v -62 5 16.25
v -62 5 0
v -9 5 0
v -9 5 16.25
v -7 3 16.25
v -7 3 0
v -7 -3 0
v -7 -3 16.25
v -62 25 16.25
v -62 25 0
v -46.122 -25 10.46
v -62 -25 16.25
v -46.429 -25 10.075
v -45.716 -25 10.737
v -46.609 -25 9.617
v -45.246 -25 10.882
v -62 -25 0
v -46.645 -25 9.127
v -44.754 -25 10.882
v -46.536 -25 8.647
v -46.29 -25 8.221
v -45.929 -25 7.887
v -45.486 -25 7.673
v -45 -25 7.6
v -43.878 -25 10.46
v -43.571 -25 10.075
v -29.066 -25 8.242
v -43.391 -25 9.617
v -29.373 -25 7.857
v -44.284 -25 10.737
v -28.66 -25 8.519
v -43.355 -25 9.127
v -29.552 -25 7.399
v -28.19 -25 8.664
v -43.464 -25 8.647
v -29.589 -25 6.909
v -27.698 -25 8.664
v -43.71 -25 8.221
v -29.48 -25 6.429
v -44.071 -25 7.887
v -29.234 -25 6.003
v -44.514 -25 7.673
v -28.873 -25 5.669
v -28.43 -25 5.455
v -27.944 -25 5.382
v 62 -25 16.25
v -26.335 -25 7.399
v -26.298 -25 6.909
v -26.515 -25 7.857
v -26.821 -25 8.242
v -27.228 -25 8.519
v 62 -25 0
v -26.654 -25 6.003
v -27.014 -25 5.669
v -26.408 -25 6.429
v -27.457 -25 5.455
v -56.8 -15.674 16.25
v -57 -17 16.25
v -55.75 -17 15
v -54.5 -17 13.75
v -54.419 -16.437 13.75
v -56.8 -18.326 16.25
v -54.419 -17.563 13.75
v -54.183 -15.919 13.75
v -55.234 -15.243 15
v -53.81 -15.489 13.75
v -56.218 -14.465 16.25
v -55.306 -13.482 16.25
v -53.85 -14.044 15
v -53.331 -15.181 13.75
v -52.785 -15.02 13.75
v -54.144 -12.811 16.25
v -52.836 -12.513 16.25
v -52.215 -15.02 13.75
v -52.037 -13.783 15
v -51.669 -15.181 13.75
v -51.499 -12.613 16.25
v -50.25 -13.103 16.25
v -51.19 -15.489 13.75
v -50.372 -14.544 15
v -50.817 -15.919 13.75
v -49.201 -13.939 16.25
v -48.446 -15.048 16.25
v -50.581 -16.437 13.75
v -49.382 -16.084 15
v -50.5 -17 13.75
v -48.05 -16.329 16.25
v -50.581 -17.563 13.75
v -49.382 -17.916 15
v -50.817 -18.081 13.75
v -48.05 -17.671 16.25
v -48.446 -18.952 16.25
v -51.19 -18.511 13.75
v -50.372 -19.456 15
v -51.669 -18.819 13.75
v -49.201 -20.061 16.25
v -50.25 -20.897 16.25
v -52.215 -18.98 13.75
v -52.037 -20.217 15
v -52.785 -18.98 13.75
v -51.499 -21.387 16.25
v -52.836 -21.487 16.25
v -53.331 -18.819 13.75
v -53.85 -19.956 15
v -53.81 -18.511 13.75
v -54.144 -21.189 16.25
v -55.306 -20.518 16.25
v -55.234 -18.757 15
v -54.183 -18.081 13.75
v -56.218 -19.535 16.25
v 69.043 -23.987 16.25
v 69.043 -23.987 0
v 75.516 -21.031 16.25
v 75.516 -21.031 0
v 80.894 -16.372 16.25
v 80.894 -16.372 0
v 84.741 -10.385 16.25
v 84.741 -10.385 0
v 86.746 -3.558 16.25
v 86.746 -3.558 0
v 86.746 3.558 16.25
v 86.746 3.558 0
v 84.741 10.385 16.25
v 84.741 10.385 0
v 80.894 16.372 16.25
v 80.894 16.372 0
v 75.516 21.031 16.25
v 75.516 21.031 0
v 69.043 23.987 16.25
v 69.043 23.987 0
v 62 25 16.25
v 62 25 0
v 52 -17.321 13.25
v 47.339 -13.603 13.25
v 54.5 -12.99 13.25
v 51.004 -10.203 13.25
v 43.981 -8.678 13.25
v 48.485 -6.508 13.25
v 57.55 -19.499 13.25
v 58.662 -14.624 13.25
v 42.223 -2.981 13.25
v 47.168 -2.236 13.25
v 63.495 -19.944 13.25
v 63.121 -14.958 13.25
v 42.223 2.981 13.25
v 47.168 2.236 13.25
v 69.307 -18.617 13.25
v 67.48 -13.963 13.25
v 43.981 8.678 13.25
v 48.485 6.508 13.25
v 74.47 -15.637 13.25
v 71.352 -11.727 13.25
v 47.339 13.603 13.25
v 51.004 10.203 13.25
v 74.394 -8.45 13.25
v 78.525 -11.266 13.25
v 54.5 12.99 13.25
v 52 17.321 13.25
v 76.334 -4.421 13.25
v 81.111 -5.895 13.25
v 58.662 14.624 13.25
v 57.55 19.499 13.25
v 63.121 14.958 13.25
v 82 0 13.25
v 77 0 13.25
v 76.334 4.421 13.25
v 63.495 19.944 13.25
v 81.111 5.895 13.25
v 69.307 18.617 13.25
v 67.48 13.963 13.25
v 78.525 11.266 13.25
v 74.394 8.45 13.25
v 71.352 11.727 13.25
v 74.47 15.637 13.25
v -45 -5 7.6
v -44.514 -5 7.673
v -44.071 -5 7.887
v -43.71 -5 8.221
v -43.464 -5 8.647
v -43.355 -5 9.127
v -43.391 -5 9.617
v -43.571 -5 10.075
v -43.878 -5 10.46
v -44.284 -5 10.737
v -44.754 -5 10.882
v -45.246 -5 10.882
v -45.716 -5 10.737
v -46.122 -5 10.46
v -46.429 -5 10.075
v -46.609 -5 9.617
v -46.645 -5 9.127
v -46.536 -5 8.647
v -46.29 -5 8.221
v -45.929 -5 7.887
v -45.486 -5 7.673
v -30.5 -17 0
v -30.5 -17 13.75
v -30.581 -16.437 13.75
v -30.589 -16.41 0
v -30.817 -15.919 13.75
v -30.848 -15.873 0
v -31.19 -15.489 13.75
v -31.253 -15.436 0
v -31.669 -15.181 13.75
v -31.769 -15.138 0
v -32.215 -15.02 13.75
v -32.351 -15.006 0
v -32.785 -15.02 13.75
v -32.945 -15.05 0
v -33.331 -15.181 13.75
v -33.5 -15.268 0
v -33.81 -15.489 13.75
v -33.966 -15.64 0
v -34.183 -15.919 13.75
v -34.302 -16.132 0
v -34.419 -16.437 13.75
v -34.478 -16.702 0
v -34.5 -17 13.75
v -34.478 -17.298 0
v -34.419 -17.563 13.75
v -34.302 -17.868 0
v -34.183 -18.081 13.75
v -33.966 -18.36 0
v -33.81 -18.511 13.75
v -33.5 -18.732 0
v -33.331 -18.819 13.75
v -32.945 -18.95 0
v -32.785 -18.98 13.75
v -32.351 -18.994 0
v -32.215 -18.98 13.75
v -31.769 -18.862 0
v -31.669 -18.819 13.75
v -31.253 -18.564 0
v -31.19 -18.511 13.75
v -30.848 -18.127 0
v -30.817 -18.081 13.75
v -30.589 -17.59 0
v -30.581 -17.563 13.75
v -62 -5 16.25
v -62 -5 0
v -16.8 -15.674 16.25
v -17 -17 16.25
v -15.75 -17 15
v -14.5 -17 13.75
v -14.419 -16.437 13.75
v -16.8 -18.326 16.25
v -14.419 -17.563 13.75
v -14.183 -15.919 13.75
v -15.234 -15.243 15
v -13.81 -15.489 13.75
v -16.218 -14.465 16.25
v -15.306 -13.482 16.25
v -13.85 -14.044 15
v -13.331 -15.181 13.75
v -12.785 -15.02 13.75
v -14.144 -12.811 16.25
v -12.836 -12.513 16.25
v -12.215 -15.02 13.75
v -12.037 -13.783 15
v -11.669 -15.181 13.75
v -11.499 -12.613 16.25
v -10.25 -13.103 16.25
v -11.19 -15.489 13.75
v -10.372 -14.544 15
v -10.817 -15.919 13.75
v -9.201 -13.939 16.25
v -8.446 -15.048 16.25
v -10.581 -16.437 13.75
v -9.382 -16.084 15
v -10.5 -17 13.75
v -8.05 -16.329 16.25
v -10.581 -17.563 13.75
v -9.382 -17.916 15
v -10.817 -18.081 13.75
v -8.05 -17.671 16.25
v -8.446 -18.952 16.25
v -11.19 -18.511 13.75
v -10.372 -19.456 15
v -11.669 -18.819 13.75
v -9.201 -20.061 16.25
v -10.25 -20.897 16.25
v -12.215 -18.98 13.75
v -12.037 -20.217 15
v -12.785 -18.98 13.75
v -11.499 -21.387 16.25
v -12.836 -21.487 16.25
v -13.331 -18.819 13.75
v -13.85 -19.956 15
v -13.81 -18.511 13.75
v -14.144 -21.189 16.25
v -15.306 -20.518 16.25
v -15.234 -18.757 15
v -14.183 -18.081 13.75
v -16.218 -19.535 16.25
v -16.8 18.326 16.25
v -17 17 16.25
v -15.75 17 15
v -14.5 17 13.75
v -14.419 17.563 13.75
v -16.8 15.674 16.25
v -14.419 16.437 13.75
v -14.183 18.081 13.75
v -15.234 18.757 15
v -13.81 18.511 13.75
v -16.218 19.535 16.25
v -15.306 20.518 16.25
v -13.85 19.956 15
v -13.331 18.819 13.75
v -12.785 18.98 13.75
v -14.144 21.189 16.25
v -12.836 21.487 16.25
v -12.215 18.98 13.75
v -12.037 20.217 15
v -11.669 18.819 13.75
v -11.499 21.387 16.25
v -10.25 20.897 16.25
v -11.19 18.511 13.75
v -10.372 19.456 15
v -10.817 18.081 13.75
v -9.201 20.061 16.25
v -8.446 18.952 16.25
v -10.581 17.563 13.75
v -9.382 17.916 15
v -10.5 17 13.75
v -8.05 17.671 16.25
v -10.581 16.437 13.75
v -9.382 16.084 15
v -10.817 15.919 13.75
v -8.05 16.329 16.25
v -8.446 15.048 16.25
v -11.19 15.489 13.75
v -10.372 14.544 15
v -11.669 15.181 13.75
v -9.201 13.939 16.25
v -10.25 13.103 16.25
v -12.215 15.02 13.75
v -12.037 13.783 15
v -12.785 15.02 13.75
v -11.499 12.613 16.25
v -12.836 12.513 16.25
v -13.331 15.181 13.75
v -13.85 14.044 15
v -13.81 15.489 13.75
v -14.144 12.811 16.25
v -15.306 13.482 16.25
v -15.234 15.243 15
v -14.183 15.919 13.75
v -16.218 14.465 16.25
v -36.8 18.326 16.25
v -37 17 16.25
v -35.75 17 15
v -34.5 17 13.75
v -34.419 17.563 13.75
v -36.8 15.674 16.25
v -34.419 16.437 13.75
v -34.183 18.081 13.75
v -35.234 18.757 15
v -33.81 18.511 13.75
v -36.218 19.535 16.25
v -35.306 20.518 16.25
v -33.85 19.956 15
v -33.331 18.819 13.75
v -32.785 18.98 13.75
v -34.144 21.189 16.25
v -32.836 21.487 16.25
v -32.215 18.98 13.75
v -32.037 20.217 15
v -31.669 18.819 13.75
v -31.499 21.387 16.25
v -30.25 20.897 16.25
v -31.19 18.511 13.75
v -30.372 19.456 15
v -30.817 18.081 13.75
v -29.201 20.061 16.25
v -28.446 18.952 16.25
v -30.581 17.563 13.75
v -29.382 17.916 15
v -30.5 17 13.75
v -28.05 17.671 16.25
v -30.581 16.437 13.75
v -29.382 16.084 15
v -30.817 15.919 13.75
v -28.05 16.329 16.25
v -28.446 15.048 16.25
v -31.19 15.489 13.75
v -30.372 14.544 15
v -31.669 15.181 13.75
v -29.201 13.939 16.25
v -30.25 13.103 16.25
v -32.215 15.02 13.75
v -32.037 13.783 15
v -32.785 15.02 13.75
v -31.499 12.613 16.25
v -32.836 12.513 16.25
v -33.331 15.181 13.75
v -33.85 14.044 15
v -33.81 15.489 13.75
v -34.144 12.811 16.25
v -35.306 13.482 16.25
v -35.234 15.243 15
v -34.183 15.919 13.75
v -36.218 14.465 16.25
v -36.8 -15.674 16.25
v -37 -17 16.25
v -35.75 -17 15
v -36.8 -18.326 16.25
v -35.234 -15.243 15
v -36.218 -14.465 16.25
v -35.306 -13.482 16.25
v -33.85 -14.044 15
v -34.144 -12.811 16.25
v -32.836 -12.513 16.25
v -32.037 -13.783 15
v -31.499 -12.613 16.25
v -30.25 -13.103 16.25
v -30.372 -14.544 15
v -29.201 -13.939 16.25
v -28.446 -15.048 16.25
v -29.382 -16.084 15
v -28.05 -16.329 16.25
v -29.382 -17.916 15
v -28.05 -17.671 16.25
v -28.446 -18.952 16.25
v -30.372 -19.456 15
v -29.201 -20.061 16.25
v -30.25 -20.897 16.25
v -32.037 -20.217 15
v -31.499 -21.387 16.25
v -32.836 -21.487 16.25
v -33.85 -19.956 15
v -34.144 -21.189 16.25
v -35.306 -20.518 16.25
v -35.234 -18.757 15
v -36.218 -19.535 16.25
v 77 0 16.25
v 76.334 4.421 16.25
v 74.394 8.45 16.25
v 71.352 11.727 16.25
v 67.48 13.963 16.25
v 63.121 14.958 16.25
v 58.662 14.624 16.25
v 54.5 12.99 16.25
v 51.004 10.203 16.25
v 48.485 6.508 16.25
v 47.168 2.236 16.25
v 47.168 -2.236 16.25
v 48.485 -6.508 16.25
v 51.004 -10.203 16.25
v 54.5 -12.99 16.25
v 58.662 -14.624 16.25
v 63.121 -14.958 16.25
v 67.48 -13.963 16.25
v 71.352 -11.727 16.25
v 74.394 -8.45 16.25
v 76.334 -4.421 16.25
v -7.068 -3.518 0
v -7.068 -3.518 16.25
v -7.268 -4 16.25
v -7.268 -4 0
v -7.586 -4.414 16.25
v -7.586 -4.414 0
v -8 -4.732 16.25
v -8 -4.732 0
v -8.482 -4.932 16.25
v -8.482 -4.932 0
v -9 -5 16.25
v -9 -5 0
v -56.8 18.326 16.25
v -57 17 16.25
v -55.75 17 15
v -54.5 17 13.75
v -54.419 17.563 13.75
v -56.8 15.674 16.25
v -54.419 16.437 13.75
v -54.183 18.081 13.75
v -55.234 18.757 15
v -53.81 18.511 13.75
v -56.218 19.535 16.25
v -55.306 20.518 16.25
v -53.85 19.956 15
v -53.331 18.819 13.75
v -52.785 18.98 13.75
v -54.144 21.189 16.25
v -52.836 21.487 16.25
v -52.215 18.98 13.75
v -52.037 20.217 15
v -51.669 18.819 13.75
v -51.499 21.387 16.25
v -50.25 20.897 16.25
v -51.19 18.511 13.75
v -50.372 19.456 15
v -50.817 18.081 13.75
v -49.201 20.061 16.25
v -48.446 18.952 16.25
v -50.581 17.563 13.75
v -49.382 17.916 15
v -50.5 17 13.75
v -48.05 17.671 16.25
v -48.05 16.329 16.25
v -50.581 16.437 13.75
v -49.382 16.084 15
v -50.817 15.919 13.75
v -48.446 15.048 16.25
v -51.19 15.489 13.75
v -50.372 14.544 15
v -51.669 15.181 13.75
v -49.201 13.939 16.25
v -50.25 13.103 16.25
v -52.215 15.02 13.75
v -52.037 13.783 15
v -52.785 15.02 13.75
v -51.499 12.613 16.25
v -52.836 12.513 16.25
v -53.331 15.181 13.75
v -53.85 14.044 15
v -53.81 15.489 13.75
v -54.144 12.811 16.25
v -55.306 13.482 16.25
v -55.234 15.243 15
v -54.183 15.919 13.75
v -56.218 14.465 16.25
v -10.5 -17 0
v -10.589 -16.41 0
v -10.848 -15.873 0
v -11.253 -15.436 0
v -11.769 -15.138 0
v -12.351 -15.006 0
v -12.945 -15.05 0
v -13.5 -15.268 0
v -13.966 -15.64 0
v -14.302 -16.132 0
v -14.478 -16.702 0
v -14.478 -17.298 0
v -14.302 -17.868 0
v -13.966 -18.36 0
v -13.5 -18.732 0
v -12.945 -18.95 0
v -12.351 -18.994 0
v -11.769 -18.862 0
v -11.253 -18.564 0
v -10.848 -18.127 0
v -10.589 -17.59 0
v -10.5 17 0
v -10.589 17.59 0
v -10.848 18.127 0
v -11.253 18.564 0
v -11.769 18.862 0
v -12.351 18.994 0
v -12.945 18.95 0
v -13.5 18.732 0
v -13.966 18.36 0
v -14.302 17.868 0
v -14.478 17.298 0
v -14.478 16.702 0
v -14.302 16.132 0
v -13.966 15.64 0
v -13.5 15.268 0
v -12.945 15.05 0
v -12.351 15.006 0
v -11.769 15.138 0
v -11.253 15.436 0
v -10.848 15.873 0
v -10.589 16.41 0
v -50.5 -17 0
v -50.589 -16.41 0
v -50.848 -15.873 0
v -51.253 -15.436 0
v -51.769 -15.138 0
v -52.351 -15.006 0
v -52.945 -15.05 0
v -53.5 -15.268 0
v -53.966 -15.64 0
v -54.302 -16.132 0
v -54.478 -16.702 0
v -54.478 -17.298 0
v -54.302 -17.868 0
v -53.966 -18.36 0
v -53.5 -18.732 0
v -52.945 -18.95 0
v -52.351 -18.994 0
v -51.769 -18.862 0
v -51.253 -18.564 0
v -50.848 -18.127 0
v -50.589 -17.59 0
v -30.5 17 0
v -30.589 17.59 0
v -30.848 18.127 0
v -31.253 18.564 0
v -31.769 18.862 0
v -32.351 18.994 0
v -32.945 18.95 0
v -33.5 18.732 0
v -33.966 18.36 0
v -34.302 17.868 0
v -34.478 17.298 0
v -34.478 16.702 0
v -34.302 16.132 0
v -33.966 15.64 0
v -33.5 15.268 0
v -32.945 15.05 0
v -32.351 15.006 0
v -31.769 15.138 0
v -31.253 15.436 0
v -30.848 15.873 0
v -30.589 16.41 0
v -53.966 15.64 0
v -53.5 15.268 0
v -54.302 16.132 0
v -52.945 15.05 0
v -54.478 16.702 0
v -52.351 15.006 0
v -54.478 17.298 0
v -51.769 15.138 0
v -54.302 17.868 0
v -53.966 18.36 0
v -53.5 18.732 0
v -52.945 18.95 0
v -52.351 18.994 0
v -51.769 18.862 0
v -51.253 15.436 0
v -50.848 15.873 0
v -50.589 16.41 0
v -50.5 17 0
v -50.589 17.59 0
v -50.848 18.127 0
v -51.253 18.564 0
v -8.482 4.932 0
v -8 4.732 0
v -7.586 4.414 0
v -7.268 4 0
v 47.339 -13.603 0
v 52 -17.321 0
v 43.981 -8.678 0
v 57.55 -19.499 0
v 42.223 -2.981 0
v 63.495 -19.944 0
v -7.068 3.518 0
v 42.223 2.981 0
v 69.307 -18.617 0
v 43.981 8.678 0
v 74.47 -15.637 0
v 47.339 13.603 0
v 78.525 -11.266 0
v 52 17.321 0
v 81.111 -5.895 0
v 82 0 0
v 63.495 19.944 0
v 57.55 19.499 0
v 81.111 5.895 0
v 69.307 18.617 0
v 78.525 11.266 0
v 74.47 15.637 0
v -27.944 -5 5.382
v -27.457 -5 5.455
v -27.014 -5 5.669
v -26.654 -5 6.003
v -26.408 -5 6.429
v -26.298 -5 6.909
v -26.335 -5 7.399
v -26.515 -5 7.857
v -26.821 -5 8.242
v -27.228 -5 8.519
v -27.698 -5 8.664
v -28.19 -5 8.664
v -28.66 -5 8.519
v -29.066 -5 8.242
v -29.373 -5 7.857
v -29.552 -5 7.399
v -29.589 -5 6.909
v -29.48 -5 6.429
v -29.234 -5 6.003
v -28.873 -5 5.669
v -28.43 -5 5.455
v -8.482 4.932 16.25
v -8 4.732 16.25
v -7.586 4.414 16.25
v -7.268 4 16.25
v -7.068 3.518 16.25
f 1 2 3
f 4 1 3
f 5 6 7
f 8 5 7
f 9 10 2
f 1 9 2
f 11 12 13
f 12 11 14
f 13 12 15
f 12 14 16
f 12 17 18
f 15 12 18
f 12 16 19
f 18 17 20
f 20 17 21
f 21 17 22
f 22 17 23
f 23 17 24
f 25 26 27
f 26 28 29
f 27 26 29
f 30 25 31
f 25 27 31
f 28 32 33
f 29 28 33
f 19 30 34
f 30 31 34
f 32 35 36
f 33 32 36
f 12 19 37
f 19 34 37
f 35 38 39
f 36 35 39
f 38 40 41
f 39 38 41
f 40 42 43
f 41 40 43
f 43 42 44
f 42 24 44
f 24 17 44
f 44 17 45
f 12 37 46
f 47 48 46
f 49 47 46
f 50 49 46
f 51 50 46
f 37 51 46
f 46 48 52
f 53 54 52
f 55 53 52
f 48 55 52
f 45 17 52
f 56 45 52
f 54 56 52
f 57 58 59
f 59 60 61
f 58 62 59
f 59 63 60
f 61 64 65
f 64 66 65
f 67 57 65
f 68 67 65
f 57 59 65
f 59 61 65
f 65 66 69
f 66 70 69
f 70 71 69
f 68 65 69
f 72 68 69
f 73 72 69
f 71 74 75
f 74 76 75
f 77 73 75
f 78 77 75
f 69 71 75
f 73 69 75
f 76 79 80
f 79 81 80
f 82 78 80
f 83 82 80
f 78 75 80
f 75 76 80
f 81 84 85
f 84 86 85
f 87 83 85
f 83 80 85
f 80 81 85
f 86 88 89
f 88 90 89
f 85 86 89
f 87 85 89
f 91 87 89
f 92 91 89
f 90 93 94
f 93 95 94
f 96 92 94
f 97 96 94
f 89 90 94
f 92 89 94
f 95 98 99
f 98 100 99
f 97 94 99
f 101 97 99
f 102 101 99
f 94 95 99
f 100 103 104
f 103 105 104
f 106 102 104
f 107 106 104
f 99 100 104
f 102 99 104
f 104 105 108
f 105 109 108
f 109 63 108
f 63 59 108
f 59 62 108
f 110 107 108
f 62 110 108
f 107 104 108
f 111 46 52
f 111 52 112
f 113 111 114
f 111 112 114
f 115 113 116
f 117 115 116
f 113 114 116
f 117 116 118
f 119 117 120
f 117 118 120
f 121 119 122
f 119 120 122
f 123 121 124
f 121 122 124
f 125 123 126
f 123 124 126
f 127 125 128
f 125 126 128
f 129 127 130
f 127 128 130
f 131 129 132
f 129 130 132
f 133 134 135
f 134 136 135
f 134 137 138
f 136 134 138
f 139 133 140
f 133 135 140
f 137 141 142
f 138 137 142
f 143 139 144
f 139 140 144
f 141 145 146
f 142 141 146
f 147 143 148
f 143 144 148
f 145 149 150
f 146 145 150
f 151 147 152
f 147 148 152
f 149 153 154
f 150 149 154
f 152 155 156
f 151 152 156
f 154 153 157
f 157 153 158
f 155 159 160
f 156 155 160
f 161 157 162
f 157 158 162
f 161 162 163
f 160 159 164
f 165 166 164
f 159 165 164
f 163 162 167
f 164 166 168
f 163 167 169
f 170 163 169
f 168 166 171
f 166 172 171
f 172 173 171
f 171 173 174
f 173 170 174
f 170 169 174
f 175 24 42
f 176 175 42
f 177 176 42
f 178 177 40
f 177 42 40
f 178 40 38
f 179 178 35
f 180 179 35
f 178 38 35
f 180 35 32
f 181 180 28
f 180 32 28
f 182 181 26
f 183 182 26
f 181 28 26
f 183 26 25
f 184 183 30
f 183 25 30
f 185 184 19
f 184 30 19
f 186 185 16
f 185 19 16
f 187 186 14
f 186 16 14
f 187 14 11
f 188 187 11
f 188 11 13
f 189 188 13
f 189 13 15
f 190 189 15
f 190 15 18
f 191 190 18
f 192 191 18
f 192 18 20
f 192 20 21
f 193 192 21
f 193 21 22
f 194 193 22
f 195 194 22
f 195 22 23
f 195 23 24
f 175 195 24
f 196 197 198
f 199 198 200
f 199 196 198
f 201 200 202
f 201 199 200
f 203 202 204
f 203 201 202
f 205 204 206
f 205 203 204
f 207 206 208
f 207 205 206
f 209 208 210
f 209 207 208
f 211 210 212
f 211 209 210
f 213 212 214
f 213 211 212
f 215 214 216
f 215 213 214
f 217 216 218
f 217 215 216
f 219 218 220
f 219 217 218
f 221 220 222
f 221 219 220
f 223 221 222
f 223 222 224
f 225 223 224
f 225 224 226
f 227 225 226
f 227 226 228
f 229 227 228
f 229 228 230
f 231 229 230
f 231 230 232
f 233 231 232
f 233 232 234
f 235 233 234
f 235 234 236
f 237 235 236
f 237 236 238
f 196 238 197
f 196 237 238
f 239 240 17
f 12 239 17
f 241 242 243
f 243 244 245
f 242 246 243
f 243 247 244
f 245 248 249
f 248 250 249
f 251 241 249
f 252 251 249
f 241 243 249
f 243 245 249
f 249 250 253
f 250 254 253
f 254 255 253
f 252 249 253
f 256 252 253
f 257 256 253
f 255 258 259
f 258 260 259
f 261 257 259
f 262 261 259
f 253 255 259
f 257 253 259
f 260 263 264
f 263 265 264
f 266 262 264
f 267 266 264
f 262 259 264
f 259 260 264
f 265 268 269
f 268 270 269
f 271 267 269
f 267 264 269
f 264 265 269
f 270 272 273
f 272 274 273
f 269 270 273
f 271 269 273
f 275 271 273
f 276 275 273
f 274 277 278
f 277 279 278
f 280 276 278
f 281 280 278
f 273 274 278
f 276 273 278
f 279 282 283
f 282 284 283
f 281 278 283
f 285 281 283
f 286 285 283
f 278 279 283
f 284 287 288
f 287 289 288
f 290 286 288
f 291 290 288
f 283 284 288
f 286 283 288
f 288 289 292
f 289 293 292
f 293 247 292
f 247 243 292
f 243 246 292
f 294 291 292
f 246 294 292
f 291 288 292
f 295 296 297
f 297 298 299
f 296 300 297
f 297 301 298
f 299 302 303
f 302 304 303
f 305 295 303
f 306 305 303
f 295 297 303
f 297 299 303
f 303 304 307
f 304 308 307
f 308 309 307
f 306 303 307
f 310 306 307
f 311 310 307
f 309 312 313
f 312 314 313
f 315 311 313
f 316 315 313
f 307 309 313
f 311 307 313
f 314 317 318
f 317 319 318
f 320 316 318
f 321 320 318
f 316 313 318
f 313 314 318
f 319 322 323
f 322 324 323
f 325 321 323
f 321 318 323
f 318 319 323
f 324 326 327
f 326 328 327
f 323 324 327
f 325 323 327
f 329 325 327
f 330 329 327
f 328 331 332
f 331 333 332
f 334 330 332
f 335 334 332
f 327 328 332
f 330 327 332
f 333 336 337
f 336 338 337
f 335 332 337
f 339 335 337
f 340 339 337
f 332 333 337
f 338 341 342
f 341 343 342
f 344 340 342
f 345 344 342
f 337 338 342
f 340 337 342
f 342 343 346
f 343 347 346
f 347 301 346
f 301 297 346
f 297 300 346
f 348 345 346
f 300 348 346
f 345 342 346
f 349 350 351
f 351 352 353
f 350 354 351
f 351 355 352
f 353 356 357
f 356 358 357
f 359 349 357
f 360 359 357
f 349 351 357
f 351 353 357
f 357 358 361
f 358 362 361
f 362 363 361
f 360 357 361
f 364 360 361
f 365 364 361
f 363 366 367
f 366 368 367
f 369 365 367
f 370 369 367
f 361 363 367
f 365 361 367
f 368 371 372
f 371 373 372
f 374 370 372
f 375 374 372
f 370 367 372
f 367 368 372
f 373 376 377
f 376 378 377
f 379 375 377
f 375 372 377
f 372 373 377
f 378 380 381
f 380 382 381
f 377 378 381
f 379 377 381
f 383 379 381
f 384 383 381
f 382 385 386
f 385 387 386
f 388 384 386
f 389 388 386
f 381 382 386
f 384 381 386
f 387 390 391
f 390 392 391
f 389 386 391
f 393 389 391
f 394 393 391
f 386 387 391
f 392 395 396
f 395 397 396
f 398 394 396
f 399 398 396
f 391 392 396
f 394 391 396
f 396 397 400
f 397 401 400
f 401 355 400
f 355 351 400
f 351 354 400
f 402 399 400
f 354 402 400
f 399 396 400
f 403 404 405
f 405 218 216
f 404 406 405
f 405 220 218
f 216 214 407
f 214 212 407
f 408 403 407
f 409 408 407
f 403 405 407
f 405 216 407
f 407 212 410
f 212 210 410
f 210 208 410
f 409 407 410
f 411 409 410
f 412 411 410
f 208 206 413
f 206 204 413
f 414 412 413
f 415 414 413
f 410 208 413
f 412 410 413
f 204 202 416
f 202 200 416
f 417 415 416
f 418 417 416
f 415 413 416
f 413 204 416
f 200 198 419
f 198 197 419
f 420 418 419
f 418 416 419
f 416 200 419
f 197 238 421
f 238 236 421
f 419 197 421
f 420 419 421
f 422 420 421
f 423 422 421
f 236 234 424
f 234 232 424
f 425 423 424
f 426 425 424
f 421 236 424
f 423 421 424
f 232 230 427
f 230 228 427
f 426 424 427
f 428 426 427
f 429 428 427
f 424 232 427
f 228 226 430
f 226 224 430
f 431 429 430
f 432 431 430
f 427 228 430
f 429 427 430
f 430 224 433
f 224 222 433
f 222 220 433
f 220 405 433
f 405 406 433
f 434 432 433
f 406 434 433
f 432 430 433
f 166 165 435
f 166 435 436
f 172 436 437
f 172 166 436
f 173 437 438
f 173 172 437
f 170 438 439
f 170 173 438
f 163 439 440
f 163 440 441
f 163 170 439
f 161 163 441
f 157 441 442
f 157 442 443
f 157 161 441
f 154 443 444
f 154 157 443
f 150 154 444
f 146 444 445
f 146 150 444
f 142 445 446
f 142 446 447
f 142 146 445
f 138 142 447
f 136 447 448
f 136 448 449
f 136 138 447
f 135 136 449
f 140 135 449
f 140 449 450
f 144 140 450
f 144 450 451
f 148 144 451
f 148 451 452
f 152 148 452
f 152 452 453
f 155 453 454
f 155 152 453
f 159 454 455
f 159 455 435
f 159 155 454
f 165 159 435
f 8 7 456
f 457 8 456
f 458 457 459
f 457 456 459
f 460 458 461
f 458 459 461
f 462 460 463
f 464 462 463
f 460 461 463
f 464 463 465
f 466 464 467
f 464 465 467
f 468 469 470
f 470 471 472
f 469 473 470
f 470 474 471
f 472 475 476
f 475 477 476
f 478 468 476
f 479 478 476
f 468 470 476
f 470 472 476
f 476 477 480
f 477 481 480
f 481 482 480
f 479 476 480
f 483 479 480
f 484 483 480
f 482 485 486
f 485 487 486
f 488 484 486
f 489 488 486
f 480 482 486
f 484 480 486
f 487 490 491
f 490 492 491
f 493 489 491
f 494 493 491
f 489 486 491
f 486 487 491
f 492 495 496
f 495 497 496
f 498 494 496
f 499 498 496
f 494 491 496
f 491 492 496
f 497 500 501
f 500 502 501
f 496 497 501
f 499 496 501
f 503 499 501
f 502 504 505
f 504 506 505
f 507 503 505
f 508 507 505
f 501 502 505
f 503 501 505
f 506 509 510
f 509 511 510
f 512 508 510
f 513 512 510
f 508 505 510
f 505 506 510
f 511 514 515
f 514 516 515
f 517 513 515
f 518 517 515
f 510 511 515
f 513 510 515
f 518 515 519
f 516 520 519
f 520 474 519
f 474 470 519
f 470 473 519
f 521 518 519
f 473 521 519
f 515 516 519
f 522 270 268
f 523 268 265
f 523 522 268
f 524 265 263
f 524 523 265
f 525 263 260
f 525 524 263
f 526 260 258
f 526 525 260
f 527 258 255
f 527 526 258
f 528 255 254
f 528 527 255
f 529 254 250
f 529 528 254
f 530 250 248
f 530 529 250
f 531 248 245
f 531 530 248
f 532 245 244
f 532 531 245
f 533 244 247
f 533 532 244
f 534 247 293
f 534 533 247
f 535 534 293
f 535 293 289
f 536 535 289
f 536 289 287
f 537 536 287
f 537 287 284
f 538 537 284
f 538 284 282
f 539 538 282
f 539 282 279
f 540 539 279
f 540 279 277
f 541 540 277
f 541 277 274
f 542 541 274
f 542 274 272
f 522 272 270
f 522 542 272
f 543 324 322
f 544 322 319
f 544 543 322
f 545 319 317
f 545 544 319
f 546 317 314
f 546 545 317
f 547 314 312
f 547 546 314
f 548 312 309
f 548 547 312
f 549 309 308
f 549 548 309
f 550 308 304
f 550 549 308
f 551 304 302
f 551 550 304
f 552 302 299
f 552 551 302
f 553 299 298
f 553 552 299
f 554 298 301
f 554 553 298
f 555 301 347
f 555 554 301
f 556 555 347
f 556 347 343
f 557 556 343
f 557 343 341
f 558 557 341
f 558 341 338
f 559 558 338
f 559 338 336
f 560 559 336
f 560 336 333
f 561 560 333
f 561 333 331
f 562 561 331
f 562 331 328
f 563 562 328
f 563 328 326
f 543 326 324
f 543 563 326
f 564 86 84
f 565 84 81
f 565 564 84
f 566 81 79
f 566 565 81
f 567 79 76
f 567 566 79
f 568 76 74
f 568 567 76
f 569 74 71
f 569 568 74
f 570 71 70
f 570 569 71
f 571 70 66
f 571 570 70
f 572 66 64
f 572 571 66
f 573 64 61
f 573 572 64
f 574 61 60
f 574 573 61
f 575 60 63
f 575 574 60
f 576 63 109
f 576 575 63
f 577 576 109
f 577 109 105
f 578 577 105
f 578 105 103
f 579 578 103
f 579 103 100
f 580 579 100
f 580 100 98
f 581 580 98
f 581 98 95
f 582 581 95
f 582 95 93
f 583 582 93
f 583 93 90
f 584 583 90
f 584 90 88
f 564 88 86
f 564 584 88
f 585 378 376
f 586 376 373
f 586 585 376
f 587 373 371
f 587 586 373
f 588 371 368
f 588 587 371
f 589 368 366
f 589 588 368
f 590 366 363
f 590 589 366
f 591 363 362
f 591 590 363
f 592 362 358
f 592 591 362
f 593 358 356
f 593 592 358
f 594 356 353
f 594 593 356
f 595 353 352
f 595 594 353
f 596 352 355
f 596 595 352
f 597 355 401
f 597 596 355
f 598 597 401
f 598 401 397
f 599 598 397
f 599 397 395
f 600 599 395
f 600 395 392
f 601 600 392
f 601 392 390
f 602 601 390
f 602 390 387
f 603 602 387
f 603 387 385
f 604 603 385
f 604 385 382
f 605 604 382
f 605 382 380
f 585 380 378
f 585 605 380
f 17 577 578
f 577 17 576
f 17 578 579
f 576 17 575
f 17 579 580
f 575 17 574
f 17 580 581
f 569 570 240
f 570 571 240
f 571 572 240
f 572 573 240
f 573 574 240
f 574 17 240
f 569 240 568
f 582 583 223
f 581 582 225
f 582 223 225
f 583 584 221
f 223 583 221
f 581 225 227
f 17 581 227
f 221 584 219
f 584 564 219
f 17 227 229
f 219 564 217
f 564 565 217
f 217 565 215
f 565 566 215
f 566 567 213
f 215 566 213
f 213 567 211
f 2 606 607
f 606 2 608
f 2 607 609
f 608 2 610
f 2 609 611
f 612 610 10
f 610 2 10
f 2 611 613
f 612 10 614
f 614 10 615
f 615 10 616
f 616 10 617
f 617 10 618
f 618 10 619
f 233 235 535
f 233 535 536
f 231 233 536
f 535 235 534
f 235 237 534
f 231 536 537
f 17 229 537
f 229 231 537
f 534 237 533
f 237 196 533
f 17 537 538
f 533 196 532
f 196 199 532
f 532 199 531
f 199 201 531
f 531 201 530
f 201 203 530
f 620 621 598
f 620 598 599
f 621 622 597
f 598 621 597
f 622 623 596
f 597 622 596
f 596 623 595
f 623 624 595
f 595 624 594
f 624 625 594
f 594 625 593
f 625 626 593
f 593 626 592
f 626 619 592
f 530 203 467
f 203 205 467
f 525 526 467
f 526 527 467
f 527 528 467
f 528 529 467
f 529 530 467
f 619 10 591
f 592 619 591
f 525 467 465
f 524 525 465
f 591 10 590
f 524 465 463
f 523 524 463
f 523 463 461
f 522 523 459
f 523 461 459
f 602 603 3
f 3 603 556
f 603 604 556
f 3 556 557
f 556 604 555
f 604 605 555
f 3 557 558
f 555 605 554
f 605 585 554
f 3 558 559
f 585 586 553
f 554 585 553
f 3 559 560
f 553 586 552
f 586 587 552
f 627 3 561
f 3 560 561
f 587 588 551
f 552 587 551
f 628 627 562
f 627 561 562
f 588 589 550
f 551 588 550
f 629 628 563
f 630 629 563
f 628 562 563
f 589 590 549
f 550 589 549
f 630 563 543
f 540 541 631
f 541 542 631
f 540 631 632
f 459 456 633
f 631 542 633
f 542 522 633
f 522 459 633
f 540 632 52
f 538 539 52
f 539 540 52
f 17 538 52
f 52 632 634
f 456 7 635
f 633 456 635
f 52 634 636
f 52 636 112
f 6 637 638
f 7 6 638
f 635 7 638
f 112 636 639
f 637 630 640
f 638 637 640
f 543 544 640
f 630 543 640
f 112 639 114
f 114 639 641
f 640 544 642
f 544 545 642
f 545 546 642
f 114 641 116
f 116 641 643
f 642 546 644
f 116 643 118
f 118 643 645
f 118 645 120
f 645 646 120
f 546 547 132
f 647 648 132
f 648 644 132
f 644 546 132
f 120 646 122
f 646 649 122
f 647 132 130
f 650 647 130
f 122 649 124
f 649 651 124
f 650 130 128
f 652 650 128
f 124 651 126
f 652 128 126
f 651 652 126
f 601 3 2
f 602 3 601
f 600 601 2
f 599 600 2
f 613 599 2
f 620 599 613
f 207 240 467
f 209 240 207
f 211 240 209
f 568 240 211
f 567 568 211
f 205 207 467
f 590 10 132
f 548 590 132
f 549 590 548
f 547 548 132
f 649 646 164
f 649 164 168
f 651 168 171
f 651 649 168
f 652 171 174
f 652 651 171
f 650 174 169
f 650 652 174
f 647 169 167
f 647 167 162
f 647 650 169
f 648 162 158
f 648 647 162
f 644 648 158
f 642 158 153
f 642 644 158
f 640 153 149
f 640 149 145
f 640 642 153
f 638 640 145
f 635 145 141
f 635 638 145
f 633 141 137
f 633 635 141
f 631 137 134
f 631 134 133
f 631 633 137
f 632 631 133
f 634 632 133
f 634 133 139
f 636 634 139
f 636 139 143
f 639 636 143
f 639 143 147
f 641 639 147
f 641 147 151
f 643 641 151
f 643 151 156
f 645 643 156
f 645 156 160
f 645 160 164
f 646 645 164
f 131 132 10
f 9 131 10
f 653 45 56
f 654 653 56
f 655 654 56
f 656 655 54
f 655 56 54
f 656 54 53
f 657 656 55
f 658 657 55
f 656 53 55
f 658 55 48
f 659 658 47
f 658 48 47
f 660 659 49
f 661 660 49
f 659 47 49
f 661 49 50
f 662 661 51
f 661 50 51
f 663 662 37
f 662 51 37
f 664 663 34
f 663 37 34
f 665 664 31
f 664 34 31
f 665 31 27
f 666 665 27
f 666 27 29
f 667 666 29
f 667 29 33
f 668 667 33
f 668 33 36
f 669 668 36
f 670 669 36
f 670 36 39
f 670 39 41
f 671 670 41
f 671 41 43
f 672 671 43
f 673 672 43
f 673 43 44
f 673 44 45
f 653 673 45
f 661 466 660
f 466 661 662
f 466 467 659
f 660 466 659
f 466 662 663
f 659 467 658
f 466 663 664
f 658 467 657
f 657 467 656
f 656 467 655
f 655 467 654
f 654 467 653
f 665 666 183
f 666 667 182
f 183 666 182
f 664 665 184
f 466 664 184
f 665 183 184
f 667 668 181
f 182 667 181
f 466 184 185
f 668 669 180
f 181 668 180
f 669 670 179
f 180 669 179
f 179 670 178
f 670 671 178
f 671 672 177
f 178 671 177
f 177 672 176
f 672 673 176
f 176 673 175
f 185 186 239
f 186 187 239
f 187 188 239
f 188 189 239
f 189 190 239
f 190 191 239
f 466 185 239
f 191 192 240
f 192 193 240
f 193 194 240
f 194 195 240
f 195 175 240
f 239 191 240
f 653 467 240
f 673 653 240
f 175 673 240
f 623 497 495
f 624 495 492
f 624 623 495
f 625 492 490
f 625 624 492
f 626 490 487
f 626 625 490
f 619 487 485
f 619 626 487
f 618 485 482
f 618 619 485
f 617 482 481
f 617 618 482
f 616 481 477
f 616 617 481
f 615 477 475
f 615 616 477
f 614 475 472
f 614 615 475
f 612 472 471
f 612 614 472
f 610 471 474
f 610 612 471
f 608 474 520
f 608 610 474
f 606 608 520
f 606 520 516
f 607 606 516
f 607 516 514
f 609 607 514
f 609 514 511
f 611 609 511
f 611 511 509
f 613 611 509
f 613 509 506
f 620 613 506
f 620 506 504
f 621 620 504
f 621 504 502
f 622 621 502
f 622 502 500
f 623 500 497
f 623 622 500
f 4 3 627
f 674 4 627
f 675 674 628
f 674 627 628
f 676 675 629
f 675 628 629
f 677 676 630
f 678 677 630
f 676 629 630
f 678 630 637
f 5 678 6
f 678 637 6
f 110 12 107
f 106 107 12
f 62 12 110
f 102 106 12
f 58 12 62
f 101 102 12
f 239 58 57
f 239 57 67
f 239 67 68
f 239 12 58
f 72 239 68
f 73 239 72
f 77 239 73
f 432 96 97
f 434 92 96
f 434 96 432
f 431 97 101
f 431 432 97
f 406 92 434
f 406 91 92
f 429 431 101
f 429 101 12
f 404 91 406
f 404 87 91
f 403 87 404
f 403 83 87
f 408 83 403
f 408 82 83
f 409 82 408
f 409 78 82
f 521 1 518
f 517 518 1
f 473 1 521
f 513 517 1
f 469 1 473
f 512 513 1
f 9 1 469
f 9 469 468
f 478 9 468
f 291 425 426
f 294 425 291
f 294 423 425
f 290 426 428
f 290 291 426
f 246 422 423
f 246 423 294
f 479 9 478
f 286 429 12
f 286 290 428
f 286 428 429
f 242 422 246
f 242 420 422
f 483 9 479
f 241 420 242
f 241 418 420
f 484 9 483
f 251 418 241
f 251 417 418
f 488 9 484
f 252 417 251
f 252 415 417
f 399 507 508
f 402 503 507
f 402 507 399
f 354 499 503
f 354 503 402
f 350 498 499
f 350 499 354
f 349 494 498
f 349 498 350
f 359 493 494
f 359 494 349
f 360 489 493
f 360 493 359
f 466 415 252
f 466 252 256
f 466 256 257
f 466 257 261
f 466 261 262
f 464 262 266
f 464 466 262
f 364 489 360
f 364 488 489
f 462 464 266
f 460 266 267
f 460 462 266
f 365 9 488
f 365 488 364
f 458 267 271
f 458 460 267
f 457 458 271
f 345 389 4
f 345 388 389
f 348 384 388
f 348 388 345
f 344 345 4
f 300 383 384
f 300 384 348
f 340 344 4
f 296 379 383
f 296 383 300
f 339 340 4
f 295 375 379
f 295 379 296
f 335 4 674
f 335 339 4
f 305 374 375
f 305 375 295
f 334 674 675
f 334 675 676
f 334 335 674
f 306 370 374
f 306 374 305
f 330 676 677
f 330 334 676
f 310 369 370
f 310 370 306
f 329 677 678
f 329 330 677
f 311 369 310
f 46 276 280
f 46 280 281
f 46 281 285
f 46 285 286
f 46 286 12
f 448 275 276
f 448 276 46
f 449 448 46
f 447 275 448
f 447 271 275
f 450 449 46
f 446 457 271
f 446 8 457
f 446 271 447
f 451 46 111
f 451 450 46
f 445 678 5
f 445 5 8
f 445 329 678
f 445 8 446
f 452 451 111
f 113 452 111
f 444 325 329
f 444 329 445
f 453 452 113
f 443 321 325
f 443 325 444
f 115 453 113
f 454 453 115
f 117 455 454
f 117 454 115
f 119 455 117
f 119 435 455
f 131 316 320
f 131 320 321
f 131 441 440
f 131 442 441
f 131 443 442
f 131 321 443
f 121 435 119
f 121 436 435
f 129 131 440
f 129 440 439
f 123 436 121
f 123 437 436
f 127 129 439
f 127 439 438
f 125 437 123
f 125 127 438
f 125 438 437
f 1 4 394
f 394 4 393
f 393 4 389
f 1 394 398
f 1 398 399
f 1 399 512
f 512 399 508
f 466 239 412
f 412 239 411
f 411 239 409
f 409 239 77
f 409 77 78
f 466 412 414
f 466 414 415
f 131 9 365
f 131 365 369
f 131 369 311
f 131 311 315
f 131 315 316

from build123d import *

# Parameters (mm, degrees)
SKETCH1_R                                       = 20
SKETCH1_R_2                                     = 2
BOSS_EXTRUDE1_DEPTH                             = 16.25
BOSS_EXTRUDE2_START                             = -3
SKETCH2_R                                       = 20
SKETCH2_R_2                                     = 15
BOSS_EXTRUDE2_DEPTH                             = 3
CSK_FOR_M5_FLAT_HEAD_MACHINE_SCREW1_D           = 4
CSK_FOR_M5_FLAT_HEAD_MACHINE_SCREW1_CSINK_D     = 9
CSK_FOR_M5_FLAT_HEAD_MACHINE_SCREW1_CSINK_ANGLE = 90
CUT_EXTRUDE1_REACH                              = 103.652
SKETCH7_R                                       = 1.65


with BuildPart() as part:
    # Sketch1 → Boss-Extrude1 (new body)
    with BuildSketch(Plane.XY):
        with BuildLine():
            Line((-62, 5), (-9, 5))
            ThreePointArc((-9, 5), (-7.585786438, 4.414213562), (-7, 3))
            Line((-7, 3), (-7, -3))
            ThreePointArc((-7, -3), (-7.585786438, -4.414213562), (-9, -5))
            Line((-9, -5), (-62, -5))
            Line((-62, -5), (-62, -25))
            Line((-62, -25), (62, -25))
            ThreePointArc((62, -25), (87, 0), (62, 25))
            Line((62, 25), (-62, 25))
            Line((-62, 25), (-62, 5))
        make_face()
        with Locations((62, 0)):
            Circle(SKETCH1_R, mode=Mode.SUBTRACT)
        with Locations((-52.5, 17)):
            Circle(SKETCH1_R_2, mode=Mode.SUBTRACT)
        with Locations((-32.5, 17)):
            Circle(SKETCH1_R_2, mode=Mode.SUBTRACT)
        with Locations((-12.5, 17)):
            Circle(SKETCH1_R_2, mode=Mode.SUBTRACT)
        with Locations((-32.5, -17)):
            Circle(SKETCH1_R_2, mode=Mode.SUBTRACT)
        with Locations((-12.5, -17)):
            Circle(SKETCH1_R_2, mode=Mode.SUBTRACT)
        with Locations((-52.5, -17)):
            Circle(SKETCH1_R_2, mode=Mode.SUBTRACT)
    extrude(amount=BOSS_EXTRUDE1_DEPTH)

    # Sketch2 → Boss-Extrude2 (add)
    with BuildSketch(Plane.XY.offset(16.25).offset(BOSS_EXTRUDE2_START)):
        with Locations((62, 0)):
            Circle(SKETCH2_R)
        with Locations((62, 0)):
            Circle(SKETCH2_R_2, mode=Mode.SUBTRACT)
    extrude(amount=BOSS_EXTRUDE2_DEPTH)

    # CSK for M5 Flat Head Machine Screw1 (through all)
    with Locations(Plane.XY.offset(16.25)):
        with Locations((-52.5, 17), (-32.5, 17), (-12.5, 17), (-52.5, -17), (-32.5, -17), (-12.5, -17)):
            CounterSinkHole(CSK_FOR_M5_FLAT_HEAD_MACHINE_SCREW1_D / 2, CSK_FOR_M5_FLAT_HEAD_MACHINE_SCREW1_CSINK_D / 2, counter_sink_angle=CSK_FOR_M5_FLAT_HEAD_MACHINE_SCREW1_CSINK_ANGLE)

    # Sketch7 → Cut-Extrude1 (cut, up to next)
    with BuildSketch(Plane.XZ.offset(25), mode=Mode.PRIVATE) as cut_extrude1_sk1:
        with Locations(Location((-45, 9.25, 0), (0, 0, 270))):
            Circle(SKETCH7_R)
    cut_extrude1_tool1 = extrude(cut_extrude1_sk1.sketch, amount=-CUT_EXTRUDE1_REACH, mode=Mode.PRIVATE) & part.part
    # Sketch7 → Cut-Extrude1 (cut, up to next)
    with BuildSketch(Plane.XZ.offset(25), mode=Mode.PRIVATE) as cut_extrude1_sk2:
        with Locations(Location((-27.943596514, 7.032095554, 0), (0, 0, 270))):
            Circle(SKETCH7_R)
    cut_extrude1_tool2 = extrude(cut_extrude1_sk2.sketch, amount=-CUT_EXTRUDE1_REACH, mode=Mode.PRIVATE) & part.part
    add(cut_extrude1_tool1.solids().sort_by_distance((-45, -25, 9.25))[0], mode=Mode.SUBTRACT)
    add(cut_extrude1_tool2.solids().sort_by_distance((-27.943597, -25, 7.032096))[0], mode=Mode.SUBTRACT)


solid = part.part
